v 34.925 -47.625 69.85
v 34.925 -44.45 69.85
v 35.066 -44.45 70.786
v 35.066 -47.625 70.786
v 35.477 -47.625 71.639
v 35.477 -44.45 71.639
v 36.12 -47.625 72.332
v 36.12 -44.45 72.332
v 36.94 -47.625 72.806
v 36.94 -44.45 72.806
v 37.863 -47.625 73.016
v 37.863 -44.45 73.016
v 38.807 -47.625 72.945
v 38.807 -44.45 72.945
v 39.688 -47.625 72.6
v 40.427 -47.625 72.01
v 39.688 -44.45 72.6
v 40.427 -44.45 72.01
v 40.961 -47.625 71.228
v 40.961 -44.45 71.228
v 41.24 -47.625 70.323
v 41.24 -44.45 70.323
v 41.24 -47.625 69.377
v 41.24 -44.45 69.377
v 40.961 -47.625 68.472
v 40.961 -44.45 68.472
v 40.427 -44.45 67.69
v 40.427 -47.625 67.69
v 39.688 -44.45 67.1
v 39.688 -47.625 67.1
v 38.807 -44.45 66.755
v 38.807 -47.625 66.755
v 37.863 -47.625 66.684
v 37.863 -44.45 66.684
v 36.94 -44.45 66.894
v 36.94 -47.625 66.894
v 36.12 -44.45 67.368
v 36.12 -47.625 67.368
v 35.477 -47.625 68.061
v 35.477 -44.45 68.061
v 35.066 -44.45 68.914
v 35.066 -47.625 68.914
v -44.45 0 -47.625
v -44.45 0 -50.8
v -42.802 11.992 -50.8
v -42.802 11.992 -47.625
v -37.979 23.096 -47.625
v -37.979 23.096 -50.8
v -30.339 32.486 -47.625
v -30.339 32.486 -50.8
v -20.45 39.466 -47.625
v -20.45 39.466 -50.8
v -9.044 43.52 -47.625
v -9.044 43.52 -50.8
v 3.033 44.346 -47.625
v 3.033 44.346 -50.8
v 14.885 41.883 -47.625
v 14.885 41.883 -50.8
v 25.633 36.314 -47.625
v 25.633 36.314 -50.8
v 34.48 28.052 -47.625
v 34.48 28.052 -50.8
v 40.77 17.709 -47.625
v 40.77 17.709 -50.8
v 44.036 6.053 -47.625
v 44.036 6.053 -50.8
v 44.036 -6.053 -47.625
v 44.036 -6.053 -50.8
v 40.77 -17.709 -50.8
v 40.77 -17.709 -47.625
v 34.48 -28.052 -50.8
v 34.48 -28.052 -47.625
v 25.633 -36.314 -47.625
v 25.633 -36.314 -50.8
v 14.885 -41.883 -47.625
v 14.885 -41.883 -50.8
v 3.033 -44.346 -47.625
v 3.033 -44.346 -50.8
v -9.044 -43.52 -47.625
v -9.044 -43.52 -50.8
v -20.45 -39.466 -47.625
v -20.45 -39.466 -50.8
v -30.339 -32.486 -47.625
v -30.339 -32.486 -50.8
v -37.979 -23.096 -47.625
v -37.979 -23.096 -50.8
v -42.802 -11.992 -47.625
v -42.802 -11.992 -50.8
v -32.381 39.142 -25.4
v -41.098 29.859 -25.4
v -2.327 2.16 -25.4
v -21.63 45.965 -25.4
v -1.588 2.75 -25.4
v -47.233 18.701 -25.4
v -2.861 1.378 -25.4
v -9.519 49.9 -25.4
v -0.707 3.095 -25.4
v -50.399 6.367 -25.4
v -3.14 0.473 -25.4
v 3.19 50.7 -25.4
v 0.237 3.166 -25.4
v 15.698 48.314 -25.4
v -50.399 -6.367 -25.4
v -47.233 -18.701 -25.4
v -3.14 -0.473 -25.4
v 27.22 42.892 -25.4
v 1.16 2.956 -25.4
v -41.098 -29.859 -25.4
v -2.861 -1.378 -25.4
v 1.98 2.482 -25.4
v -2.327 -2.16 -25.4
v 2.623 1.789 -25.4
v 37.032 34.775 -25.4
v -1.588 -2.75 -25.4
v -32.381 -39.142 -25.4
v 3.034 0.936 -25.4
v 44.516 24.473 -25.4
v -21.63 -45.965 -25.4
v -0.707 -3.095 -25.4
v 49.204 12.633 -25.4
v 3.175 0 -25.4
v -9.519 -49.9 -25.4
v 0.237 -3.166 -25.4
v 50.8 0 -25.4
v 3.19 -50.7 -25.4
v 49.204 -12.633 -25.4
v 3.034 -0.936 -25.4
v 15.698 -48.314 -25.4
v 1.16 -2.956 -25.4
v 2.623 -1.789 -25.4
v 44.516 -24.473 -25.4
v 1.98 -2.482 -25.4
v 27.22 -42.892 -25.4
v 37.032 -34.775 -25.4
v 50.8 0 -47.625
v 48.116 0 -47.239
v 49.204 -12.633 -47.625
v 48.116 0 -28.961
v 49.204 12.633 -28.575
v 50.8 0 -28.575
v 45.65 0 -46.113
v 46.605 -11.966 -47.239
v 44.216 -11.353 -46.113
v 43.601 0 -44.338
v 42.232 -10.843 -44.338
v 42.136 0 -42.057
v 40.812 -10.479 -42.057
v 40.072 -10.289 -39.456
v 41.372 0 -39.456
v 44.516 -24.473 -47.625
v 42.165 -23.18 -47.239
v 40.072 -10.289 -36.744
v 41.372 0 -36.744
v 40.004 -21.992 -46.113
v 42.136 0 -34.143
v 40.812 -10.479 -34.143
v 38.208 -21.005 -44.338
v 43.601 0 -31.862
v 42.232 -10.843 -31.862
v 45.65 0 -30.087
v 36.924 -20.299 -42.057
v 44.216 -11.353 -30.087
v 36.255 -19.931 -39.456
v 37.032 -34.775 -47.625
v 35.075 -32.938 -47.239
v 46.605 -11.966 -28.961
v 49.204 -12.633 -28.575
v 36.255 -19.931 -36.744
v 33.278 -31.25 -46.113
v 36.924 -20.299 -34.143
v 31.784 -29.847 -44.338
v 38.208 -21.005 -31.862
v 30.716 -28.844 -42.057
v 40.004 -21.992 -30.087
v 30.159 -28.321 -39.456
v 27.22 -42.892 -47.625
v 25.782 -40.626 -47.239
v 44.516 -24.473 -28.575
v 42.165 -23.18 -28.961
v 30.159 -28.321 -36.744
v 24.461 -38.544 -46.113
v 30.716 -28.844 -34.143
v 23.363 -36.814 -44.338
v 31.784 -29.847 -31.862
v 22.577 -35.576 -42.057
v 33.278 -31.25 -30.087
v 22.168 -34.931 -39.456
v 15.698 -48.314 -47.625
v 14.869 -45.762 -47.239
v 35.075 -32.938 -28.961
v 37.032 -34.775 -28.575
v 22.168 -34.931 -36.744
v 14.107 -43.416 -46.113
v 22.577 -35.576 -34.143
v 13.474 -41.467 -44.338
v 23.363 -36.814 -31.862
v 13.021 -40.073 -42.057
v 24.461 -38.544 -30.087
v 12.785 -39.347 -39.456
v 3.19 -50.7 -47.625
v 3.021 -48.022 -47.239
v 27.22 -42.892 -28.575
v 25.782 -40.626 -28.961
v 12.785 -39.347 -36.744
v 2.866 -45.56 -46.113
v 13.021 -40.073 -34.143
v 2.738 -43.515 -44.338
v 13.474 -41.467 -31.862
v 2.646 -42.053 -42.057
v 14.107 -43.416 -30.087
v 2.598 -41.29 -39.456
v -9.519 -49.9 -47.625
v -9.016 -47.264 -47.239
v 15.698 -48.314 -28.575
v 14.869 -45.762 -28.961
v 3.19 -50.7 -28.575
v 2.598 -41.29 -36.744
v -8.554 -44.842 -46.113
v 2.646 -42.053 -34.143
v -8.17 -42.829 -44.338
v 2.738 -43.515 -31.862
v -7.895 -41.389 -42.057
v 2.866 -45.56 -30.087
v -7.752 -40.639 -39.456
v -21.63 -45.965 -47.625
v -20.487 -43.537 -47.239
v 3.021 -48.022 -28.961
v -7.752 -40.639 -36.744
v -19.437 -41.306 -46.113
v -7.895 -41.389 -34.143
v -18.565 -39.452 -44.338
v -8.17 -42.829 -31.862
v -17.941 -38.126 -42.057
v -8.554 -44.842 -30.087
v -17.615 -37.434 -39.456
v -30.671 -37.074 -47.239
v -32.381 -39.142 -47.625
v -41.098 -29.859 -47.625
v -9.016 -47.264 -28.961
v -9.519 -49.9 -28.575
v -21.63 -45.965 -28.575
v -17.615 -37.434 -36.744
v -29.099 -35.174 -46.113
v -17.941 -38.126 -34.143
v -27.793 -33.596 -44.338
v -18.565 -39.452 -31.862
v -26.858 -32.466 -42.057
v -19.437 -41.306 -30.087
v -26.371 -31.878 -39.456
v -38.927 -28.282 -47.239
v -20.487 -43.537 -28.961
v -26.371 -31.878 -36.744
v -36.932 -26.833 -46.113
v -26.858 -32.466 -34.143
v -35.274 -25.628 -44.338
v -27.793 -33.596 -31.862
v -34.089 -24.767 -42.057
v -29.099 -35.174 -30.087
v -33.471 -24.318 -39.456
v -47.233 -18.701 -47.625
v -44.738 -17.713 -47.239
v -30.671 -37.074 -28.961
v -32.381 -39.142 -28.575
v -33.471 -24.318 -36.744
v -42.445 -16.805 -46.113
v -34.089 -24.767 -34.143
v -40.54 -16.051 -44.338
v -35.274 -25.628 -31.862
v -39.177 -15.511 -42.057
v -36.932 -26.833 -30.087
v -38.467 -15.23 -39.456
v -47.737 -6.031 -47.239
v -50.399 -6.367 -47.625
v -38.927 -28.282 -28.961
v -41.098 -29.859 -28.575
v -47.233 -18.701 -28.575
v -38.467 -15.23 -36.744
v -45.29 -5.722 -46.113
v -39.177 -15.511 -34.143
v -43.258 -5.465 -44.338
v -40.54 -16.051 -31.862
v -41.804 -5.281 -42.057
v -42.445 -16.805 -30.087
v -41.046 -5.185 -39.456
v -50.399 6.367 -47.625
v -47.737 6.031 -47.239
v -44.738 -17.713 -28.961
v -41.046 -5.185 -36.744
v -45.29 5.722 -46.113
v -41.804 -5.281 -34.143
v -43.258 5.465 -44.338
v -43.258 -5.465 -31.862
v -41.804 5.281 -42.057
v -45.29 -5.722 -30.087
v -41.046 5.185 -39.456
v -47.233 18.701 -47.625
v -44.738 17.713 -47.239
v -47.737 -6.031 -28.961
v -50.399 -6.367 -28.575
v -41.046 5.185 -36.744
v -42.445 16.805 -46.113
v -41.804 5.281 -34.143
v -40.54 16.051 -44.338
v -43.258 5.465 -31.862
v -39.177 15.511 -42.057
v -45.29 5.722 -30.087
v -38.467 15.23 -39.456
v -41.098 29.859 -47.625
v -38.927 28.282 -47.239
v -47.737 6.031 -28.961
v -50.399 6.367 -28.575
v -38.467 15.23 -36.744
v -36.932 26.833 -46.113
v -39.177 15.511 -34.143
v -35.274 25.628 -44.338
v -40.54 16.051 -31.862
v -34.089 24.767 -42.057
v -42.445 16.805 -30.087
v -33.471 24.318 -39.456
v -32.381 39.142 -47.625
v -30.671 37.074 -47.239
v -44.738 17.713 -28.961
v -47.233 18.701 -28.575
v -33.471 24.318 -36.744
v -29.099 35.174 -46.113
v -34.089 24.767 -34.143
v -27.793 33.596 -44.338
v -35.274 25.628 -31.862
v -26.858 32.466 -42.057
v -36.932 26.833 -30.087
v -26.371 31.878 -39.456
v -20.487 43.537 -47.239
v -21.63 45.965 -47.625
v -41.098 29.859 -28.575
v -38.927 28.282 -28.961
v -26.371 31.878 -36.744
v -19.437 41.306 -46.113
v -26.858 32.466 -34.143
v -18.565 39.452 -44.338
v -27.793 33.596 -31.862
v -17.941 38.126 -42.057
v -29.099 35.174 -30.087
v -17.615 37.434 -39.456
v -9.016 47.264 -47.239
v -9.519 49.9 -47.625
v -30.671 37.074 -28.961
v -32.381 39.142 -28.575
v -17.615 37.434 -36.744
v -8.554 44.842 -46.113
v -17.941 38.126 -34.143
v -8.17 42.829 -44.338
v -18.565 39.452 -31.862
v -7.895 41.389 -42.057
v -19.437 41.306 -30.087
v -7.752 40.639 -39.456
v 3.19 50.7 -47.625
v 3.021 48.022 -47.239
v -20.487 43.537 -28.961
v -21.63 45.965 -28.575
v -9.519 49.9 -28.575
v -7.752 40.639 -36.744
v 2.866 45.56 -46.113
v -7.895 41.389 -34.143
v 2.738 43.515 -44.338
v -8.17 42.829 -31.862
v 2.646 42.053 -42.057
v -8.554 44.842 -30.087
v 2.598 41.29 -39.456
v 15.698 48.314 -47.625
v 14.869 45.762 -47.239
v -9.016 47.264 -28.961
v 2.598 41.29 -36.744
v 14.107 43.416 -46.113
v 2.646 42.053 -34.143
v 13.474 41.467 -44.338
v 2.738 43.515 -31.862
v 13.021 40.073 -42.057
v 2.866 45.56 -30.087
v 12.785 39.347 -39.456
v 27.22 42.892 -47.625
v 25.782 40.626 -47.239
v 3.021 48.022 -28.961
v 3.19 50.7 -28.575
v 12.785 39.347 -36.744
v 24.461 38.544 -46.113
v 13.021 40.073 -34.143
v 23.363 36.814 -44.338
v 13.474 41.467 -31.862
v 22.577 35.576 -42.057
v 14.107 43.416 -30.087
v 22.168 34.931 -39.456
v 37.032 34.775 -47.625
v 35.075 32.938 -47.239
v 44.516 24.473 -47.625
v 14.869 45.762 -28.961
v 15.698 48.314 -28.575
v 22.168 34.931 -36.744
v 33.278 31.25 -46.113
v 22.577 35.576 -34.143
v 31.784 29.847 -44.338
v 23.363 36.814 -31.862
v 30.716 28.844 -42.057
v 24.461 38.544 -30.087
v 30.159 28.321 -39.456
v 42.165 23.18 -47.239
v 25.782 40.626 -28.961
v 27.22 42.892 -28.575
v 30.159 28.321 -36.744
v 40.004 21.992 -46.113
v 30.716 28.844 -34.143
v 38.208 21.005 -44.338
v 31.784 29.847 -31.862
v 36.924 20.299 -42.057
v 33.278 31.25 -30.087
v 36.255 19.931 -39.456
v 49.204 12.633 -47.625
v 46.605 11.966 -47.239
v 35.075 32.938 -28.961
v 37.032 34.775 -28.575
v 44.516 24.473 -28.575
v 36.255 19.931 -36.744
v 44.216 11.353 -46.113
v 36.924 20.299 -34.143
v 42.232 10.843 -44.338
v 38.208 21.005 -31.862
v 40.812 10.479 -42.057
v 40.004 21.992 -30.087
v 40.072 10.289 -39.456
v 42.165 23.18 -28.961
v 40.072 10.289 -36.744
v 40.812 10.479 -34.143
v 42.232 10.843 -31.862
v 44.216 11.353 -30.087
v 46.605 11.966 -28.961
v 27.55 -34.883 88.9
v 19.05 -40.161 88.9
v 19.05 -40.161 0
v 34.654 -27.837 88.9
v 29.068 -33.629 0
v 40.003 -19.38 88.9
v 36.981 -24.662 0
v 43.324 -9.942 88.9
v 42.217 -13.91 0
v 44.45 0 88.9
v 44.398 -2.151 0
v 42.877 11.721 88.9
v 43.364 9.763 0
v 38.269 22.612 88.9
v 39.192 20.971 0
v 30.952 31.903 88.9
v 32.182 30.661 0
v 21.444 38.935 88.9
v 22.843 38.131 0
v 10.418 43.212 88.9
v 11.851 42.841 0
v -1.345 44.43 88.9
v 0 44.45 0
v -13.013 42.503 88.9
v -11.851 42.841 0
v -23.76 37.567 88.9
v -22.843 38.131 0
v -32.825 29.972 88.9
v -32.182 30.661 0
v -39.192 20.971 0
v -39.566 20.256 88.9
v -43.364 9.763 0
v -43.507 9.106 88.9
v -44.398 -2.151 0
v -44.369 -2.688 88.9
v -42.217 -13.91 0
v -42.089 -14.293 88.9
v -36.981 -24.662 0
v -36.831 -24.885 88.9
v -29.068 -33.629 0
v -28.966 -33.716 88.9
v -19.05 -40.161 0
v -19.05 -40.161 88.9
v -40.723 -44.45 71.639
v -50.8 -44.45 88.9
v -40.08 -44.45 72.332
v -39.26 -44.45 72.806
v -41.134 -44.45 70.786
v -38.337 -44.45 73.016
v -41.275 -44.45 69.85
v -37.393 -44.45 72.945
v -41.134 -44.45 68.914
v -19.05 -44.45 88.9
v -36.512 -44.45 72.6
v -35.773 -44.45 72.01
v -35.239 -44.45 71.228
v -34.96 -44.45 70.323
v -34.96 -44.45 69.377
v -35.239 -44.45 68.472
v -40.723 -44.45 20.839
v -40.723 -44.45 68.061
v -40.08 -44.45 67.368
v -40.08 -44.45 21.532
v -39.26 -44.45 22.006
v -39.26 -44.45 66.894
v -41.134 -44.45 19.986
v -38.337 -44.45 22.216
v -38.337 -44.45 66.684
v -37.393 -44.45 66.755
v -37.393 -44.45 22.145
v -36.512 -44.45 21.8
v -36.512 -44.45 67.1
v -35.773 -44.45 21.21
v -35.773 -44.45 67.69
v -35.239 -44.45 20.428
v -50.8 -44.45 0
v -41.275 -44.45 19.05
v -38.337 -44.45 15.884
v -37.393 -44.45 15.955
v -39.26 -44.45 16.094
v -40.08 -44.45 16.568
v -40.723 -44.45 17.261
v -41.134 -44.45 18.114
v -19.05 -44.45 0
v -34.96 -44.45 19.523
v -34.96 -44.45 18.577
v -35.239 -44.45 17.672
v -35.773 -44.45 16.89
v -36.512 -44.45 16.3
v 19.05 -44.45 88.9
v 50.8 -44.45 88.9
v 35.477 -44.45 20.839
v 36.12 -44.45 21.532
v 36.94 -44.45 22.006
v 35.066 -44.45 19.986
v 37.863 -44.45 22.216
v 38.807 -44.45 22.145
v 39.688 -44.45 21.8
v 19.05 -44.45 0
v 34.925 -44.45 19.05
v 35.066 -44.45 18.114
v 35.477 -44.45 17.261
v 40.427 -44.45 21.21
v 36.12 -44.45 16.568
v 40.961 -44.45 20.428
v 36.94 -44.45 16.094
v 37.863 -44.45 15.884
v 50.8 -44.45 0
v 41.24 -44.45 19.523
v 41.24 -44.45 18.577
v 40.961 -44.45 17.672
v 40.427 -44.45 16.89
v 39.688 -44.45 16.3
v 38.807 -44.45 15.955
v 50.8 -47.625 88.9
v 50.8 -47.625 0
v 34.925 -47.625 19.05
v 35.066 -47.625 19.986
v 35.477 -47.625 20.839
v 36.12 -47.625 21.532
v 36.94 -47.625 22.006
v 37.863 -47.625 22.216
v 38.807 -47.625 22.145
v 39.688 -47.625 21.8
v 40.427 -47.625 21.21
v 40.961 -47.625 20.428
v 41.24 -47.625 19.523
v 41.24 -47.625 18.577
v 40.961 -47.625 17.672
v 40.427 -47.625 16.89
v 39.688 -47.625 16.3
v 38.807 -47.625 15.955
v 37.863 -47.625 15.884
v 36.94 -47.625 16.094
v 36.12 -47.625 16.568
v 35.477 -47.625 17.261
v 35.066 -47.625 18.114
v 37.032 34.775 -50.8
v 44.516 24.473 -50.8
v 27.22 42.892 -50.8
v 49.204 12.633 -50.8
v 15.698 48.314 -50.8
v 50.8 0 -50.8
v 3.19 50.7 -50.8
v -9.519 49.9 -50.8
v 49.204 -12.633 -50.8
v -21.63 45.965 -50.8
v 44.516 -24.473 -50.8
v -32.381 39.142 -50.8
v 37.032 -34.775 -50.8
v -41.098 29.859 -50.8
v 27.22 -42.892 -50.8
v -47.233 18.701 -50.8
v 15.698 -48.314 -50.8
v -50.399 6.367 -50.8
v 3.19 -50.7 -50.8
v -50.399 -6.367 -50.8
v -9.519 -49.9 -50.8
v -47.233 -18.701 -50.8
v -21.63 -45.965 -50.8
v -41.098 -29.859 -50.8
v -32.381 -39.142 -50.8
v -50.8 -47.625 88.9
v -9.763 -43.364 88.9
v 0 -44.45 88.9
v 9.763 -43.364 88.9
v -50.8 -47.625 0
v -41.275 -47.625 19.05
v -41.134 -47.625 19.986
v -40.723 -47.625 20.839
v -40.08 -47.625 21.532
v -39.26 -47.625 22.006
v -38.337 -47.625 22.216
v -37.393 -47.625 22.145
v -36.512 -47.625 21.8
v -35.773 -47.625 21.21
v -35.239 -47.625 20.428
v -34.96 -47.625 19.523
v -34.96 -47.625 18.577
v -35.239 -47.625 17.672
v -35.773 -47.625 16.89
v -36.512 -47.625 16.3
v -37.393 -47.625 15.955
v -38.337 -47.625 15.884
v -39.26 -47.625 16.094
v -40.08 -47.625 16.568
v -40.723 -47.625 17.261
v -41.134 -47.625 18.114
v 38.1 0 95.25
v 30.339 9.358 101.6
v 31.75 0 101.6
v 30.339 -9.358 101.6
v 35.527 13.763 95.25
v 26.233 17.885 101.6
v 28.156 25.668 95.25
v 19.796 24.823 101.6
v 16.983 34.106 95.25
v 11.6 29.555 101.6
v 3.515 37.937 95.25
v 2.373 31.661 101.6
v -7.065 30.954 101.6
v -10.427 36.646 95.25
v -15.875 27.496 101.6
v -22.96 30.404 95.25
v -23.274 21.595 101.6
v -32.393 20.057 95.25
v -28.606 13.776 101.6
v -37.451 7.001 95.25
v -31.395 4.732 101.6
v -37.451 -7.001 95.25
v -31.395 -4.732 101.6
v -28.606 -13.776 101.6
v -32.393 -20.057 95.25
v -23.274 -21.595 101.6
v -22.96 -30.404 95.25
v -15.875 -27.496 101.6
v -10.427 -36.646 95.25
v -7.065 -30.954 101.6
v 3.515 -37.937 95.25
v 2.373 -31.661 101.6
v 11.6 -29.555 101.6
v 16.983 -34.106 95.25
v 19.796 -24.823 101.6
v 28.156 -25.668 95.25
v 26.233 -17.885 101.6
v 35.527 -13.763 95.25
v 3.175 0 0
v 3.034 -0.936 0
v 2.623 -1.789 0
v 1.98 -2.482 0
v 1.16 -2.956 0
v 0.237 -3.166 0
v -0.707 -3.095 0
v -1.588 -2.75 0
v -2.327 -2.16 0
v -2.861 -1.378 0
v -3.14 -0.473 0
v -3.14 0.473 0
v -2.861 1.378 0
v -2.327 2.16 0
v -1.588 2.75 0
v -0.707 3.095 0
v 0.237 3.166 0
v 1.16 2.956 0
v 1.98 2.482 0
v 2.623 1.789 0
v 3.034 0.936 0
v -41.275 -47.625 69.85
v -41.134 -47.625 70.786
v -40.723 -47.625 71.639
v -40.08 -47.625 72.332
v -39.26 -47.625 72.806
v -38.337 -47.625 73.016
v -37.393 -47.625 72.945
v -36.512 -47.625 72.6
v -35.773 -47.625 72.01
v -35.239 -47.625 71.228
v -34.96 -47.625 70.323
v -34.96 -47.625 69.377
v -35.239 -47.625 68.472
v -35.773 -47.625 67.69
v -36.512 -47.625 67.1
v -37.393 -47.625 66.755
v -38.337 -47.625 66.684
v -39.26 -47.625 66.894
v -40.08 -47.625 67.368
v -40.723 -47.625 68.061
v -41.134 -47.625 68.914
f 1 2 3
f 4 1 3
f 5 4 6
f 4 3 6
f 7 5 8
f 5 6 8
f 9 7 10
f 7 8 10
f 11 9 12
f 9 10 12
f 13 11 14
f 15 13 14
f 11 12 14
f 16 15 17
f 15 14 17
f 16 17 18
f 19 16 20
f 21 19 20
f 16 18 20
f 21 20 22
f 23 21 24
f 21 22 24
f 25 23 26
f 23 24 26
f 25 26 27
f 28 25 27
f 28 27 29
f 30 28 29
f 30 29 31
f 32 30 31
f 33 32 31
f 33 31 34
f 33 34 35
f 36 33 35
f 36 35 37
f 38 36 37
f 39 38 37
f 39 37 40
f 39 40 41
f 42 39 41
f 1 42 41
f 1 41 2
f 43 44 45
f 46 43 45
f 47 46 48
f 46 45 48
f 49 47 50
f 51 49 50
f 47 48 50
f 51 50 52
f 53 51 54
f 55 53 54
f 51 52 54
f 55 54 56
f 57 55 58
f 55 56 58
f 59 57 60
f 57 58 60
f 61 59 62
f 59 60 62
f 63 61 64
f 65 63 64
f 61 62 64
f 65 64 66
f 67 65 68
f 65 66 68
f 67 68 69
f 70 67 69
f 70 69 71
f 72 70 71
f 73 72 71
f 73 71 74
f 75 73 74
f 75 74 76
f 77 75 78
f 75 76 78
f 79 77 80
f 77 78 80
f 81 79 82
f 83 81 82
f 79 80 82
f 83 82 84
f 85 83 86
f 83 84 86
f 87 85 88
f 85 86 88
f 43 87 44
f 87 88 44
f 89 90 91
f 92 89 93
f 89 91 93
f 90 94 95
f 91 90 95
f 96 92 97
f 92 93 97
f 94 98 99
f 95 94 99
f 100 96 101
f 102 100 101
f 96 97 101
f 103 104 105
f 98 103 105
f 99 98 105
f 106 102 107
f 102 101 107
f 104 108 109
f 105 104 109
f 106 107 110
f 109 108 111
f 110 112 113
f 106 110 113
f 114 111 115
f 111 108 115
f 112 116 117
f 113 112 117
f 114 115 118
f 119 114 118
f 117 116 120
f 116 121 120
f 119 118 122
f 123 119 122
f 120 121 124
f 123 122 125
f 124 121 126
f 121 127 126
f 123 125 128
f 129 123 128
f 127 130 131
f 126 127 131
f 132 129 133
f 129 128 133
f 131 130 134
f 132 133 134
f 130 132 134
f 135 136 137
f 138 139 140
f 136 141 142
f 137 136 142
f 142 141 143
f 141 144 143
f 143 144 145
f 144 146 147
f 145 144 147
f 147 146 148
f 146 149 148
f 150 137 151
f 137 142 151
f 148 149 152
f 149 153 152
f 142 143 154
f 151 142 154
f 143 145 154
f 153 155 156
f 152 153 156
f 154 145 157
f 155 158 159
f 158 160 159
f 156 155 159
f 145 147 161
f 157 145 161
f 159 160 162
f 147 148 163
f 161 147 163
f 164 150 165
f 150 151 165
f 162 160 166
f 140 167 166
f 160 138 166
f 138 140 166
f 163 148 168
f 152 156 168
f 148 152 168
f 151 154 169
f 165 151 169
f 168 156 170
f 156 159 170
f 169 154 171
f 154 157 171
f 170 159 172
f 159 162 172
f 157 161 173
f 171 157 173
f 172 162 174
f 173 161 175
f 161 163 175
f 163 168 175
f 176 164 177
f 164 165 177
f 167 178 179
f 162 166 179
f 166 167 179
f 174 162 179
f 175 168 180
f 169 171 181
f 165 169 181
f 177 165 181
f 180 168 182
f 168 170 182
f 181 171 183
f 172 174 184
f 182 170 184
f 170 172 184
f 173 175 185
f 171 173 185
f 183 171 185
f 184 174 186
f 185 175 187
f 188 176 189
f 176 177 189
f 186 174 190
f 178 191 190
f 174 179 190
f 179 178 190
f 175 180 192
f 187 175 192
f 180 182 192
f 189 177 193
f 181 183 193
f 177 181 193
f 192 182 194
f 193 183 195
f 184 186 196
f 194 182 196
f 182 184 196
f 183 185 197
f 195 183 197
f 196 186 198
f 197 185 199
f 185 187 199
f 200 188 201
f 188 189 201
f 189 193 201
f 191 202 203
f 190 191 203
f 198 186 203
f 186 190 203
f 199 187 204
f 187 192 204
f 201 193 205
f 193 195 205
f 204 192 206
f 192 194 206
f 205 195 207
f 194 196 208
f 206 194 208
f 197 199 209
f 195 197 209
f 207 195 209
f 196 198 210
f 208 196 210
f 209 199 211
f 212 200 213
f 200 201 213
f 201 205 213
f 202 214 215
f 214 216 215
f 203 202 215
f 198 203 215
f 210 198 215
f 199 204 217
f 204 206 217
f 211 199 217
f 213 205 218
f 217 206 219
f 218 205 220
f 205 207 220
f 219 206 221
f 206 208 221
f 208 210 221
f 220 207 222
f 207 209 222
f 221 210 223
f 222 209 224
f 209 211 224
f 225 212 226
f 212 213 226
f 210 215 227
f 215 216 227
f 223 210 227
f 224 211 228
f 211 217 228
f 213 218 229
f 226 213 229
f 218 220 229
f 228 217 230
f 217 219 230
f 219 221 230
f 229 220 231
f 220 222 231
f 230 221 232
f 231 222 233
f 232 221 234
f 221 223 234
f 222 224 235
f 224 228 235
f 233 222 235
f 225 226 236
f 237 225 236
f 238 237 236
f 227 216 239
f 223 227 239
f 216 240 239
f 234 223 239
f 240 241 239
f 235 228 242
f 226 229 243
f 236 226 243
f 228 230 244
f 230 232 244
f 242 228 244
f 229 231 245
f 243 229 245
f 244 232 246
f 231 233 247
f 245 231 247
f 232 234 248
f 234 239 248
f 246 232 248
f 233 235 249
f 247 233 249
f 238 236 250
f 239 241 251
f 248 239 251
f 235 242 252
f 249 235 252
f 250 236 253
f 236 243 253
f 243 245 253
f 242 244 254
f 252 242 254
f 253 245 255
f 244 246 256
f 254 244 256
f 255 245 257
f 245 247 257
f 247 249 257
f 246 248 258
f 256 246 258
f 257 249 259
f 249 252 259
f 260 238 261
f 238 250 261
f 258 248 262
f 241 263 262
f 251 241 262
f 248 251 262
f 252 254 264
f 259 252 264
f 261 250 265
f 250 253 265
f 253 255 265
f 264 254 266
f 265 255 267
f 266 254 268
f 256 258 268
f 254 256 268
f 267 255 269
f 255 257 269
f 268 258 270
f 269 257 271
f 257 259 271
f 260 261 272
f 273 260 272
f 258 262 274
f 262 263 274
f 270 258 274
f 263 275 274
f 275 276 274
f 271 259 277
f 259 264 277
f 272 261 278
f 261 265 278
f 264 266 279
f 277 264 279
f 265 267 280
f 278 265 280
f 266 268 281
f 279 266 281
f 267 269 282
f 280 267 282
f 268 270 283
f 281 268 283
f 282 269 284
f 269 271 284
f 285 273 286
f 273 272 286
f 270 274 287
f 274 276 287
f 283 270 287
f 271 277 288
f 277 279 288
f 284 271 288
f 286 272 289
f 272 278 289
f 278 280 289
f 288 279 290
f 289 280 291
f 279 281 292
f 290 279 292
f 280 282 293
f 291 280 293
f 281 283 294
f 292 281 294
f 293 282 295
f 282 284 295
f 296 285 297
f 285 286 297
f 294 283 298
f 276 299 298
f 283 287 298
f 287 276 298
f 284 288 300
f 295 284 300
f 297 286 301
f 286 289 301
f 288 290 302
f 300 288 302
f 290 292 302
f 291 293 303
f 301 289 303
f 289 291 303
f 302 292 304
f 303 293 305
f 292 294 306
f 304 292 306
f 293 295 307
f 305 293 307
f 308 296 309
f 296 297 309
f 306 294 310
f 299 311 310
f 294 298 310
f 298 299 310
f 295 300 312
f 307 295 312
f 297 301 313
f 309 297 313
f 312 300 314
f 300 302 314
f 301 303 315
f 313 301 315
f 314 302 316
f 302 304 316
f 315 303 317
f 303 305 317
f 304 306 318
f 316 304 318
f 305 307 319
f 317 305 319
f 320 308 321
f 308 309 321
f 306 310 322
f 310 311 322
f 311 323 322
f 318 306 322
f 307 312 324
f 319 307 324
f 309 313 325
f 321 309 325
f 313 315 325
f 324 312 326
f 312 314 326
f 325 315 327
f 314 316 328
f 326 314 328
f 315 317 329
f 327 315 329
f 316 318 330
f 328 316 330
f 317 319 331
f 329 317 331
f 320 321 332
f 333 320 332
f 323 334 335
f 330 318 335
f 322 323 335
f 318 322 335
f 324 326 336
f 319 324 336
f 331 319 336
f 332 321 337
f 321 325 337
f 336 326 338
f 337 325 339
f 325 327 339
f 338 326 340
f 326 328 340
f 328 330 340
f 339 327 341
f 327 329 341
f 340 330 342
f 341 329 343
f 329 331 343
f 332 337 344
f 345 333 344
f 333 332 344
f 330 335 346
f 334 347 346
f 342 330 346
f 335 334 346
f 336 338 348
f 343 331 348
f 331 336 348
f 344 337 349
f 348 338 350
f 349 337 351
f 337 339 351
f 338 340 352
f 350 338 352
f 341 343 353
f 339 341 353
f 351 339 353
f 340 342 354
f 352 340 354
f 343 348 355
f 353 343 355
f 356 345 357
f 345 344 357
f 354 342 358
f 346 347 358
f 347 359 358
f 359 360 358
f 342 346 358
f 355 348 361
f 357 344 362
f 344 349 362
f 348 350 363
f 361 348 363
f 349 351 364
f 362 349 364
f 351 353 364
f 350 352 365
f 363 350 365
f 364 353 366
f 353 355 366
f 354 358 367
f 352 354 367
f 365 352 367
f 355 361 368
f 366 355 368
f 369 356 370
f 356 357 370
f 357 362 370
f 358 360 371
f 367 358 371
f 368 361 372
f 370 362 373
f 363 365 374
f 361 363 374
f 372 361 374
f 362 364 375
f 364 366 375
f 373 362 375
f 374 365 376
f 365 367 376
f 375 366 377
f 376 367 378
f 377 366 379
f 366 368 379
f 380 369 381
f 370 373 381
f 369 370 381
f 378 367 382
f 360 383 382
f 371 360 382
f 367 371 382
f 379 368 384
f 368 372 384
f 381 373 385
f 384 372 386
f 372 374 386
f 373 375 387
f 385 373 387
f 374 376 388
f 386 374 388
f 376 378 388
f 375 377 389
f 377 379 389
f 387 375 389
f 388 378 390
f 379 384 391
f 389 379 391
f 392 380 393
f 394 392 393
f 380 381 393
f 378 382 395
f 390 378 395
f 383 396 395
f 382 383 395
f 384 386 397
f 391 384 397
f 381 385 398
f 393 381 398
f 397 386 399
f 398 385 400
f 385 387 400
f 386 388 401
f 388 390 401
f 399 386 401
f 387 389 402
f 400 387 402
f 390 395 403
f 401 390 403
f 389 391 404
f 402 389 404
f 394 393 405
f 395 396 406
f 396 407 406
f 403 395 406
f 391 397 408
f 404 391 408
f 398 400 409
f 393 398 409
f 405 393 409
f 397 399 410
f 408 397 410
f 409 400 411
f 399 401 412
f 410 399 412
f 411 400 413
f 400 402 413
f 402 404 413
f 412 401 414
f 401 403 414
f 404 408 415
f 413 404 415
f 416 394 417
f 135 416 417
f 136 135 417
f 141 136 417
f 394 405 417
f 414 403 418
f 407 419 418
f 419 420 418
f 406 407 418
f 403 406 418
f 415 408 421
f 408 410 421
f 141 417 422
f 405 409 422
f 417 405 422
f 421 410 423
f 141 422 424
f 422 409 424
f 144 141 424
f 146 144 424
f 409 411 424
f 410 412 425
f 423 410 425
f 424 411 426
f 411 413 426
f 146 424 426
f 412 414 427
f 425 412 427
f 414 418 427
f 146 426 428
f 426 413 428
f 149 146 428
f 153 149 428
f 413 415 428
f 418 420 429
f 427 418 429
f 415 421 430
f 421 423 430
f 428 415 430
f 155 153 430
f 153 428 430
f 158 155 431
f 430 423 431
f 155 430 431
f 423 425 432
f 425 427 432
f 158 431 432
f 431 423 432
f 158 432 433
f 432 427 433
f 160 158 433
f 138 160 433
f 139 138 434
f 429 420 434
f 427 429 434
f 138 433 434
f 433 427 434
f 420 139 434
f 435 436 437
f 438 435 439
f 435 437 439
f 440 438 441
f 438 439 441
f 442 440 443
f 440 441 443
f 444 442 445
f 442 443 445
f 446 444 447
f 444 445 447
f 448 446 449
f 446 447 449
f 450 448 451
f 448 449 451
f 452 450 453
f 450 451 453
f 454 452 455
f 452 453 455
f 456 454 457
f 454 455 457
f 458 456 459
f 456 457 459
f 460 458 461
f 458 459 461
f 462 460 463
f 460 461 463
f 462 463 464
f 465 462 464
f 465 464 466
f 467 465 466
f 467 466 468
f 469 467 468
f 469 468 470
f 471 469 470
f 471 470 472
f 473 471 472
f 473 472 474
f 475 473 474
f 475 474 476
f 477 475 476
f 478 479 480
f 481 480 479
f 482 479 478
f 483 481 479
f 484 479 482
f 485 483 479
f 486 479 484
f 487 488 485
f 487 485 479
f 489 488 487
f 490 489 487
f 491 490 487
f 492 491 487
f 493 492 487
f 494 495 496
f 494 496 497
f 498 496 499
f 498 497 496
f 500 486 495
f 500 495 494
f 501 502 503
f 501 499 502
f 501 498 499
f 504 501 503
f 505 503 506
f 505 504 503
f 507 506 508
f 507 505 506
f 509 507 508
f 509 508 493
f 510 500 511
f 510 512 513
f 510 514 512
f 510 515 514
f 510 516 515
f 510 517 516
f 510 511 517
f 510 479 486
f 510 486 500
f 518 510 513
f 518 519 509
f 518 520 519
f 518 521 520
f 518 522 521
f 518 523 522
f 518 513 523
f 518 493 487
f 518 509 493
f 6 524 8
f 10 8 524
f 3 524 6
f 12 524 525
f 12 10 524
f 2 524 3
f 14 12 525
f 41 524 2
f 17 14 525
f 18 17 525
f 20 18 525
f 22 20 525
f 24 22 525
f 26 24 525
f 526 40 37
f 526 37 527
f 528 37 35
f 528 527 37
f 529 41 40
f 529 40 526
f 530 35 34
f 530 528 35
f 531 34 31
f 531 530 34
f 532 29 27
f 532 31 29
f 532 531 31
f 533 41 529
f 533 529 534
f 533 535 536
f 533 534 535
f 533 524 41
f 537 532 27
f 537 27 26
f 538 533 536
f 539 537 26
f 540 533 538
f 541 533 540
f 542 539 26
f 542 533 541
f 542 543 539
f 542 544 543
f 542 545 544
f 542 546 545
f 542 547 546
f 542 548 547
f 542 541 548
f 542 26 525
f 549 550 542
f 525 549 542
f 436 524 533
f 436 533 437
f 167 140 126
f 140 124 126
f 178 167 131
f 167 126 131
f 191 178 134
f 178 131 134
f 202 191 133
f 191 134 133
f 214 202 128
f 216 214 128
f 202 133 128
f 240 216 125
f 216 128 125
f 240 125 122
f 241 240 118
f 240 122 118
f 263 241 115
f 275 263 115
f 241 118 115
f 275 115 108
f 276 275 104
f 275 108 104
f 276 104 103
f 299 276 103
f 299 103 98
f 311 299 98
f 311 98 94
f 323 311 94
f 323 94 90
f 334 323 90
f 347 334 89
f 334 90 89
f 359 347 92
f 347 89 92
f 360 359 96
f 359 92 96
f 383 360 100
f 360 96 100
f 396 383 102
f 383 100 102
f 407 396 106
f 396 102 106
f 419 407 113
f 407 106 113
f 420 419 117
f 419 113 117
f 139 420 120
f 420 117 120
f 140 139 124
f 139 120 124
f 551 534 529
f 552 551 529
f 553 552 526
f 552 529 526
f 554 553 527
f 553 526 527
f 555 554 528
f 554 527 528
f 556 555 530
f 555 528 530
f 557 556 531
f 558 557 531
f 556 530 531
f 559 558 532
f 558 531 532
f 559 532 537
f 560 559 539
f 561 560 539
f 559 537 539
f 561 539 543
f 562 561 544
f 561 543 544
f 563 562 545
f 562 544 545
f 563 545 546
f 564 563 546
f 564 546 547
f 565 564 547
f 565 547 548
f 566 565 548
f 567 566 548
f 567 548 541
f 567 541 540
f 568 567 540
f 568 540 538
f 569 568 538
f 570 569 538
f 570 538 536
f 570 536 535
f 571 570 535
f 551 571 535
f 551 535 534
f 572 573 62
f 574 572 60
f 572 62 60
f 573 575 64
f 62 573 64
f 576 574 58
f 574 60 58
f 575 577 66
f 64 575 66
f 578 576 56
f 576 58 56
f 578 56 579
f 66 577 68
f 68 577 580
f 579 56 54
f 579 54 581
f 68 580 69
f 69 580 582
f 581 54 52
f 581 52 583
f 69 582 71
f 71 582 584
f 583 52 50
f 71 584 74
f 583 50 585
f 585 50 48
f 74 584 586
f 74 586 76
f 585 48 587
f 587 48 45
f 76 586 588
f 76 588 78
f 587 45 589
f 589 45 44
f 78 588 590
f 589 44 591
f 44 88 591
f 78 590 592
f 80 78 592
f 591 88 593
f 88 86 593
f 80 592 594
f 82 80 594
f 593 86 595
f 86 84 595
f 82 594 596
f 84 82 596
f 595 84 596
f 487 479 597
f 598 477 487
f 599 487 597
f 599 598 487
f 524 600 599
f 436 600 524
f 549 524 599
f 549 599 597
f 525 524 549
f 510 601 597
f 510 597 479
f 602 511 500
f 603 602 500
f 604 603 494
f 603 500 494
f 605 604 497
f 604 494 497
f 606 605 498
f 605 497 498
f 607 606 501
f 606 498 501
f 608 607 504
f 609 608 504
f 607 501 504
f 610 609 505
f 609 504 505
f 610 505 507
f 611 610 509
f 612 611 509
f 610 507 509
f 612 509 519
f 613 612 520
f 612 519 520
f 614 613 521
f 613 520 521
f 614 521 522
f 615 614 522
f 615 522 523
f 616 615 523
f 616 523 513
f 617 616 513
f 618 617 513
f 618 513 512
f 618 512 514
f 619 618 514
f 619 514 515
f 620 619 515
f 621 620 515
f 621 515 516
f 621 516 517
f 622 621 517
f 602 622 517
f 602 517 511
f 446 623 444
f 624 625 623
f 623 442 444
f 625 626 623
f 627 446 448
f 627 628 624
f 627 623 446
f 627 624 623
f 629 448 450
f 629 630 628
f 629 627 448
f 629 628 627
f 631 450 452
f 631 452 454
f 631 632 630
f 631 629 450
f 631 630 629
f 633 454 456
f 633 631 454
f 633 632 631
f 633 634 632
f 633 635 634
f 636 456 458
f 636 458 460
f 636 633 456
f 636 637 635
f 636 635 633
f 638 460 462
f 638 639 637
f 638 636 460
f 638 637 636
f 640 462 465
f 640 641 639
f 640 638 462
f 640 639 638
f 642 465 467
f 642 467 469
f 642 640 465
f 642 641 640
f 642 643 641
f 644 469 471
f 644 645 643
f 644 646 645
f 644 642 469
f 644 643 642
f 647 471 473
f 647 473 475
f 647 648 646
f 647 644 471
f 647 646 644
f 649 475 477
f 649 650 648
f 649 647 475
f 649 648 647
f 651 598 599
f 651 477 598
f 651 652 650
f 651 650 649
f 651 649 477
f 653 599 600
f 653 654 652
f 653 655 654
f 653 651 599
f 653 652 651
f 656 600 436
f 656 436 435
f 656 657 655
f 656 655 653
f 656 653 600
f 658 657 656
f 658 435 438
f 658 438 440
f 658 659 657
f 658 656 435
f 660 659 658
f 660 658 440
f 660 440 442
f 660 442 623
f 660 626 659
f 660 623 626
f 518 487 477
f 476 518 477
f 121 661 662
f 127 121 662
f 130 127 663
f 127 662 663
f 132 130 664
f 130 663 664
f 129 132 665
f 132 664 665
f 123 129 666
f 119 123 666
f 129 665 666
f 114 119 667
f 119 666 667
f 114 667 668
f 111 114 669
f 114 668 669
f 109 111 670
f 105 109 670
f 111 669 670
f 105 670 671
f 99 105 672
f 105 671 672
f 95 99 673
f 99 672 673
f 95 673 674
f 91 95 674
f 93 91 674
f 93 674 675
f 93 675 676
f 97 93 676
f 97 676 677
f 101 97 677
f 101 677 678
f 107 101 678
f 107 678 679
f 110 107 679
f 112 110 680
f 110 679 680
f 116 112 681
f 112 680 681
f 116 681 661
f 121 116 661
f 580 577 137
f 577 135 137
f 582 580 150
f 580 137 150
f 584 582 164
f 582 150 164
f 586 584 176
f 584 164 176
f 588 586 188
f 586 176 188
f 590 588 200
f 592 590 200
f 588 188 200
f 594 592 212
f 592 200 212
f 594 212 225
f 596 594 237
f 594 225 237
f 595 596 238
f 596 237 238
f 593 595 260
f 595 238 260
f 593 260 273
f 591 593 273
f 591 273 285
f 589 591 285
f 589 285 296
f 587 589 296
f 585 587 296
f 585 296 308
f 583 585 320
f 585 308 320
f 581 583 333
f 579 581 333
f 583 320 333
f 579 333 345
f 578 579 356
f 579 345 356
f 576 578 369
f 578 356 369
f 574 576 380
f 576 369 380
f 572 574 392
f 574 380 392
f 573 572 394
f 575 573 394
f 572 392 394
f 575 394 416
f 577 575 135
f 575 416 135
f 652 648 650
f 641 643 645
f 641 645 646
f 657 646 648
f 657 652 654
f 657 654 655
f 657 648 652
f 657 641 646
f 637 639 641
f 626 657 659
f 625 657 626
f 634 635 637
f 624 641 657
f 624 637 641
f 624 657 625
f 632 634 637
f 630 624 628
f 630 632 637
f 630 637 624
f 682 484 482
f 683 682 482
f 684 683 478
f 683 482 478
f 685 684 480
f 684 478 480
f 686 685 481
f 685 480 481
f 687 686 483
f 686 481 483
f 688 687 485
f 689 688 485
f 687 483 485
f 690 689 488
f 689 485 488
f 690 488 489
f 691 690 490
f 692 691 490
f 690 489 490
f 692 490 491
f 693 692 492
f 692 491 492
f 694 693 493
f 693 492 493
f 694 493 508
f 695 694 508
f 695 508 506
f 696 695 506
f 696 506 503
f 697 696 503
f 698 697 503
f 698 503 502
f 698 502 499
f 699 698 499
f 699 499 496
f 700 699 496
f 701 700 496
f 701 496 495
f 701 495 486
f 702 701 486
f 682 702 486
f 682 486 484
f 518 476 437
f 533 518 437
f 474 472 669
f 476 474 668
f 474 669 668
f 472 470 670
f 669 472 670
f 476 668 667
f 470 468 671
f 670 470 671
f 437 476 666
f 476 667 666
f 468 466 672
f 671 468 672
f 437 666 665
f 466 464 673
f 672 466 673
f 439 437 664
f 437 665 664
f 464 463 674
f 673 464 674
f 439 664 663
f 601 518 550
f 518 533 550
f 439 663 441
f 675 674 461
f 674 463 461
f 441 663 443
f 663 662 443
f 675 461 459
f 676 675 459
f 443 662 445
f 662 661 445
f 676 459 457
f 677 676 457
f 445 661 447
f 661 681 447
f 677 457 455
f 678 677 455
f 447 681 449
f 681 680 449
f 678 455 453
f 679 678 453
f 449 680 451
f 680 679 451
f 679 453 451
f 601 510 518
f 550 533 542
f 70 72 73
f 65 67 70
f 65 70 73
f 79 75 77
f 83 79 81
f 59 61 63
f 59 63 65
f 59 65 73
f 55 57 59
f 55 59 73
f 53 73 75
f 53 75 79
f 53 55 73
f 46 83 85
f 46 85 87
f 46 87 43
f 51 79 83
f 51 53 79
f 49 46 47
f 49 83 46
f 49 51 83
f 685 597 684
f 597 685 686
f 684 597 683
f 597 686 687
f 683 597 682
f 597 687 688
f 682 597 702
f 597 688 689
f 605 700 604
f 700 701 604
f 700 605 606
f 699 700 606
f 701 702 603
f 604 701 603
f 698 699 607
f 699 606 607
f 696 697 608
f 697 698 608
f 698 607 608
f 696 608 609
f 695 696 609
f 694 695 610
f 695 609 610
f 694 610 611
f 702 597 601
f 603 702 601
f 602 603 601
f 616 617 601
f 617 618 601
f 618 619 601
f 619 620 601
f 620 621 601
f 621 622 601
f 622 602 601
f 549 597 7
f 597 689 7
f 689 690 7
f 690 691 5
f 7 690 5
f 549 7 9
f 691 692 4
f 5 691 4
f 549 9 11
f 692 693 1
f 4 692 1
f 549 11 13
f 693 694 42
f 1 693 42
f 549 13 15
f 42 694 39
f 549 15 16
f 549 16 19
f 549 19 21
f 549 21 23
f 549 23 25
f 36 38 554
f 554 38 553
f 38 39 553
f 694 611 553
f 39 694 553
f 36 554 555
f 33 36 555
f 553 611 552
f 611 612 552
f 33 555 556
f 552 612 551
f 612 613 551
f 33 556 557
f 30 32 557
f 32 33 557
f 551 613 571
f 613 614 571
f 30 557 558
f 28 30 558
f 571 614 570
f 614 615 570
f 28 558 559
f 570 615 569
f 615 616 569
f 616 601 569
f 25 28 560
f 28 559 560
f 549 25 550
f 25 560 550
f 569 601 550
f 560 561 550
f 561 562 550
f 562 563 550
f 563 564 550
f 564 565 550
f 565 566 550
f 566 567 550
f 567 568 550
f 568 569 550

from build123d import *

# Parameters (mm, degrees)
SKETCH1_R           = 44.45
BOSS_EXTRUDE1_DEPTH = 101.6
CHAMFER1_SIZE       = 12.7
SKETCH2_R           = 3.175
BOSS_EXTRUDE2_DEPTH = 25.4
SKETCH4_R           = 44.45
CUT_EXTRUDE1_DEPTH  = 3.175
SKETCH5_W           = 101.6
SKETCH5_H           = 3.175
BOSS_EXTRUDE4_DEPTH = 88.9
SKETCH6_W           = 38.1
SKETCH6_H           = 7.01009255
BOSS_EXTRUDE5_DEPTH = 88.9
SKETCH7_R           = 3.175
CUT_EXTRUDE2_DEPTH  = 88.9
SKETCH8_R           = 3.175
CUT_EXTRUDE3_DEPTH  = 88.9


with BuildPart() as part:
    # Sketch1 → Boss-Extrude1 (new body)
    with BuildSketch(Plane.XY):
        Circle(SKETCH1_R)
    extrude(amount=BOSS_EXTRUDE1_DEPTH)

    # Chamfer1
    chamfer1_edges = [part.edges().sort_by_distance(p)[0] for p in [
        (-44.45, 0, 101.6),
    ]]
    chamfer(chamfer1_edges, length=CHAMFER1_SIZE)

    # Sketch2 → Boss-Extrude2 (add)
    with BuildSketch(Plane(origin=(0, 0, 0), x_dir=(-1, 0, 0), z_dir=(0, 0, -1))):
        with Locations(Location((0, 0, 0), (0, 0, 180))):
            Circle(SKETCH2_R)
    extrude(amount=BOSS_EXTRUDE2_DEPTH)

    # Sketch3 → Revolve2 (revolve)
    with BuildSketch(Plane(origin=(0, 0, 0), x_dir=(0, 0, -1), z_dir=(1, 0, 0)), mode=Mode.PRIVATE) as revolve2_sk:
        with BuildLine():
            Line((25.4, 0), (50.8, 0))
            Line((50.8, 0), (50.8, 50.8))
            Line((50.8, 50.8), (47.625, 50.8))
            ThreePointArc((47.625, 50.8), (38.1, 41.275), (28.575, 50.8))
            Line((28.575, 50.8), (25.4, 50.8))
            Line((25.4, 50.8), (25.4, 0))
        make_face()
    revolve(revolve2_sk.sketch.rotate(Axis((0, 0, -25.4), (0, 0, -1)), 90), axis=Axis((0, 0, -25.4), (0, 0, -1)))

    # Sketch4 → Cut-Extrude1 (cut)
    with BuildSketch(Plane(origin=(0, 0, -50.8), x_dir=(-1, 0, 0), z_dir=(0, 0, -1))):
        Circle(SKETCH4_R)
    extrude(amount=-CUT_EXTRUDE1_DEPTH, mode=Mode.SUBTRACT)



with BuildPart() as body_2:
    # Sketch5 → Boss-Extrude4 (new body)
    with BuildSketch(Plane.XY):
        with Locations((0, -46.0375)):
            Rectangle(SKETCH5_W, SKETCH5_H)
    extrude(amount=BOSS_EXTRUDE4_DEPTH)


with BuildPart() as part_1:
    add(part.part)

    add(body_2.part)  # Boss-Extrude5 merges body 2
    # Sketch6 → Boss-Extrude5 (add)
    with BuildSketch(Plane.XY.offset(88.9)):
        with Locations((0, -40.944953725)):
            Rectangle(SKETCH6_W, SKETCH6_H)
    extrude(amount=-BOSS_EXTRUDE5_DEPTH)

    # Sketch7 → Cut-Extrude2 (cut)
    with BuildSketch(Plane(origin=(0, -44.45, 0), x_dir=(1, 0, 0), z_dir=(0, 1, 0))):
        with Locations(Location((38.1, -19.05, 0), (0, 0, 180))):
            Circle(SKETCH7_R)
        with Locations(Location((38.1, -69.85, 0), (0, 0, 180))):
            Circle(SKETCH7_R)
    extrude(amount=-CUT_EXTRUDE2_DEPTH, mode=Mode.SUBTRACT)

    # Sketch8 → Cut-Extrude3 (cut)
    with BuildSketch(Plane(origin=(0, -44.45, 0), x_dir=(1, 0, 0), z_dir=(0, 1, 0))):
        with Locations(Location((-38.1, -19.05, 0), (0, 0, 180))):
            Circle(SKETCH8_R)
        with Locations(Location((-38.1, -69.85, 0), (0, 0, 180))):
            Circle(SKETCH8_R)
    extrude(amount=-CUT_EXTRUDE3_DEPTH, mode=Mode.SUBTRACT)


solid = part_1.part
